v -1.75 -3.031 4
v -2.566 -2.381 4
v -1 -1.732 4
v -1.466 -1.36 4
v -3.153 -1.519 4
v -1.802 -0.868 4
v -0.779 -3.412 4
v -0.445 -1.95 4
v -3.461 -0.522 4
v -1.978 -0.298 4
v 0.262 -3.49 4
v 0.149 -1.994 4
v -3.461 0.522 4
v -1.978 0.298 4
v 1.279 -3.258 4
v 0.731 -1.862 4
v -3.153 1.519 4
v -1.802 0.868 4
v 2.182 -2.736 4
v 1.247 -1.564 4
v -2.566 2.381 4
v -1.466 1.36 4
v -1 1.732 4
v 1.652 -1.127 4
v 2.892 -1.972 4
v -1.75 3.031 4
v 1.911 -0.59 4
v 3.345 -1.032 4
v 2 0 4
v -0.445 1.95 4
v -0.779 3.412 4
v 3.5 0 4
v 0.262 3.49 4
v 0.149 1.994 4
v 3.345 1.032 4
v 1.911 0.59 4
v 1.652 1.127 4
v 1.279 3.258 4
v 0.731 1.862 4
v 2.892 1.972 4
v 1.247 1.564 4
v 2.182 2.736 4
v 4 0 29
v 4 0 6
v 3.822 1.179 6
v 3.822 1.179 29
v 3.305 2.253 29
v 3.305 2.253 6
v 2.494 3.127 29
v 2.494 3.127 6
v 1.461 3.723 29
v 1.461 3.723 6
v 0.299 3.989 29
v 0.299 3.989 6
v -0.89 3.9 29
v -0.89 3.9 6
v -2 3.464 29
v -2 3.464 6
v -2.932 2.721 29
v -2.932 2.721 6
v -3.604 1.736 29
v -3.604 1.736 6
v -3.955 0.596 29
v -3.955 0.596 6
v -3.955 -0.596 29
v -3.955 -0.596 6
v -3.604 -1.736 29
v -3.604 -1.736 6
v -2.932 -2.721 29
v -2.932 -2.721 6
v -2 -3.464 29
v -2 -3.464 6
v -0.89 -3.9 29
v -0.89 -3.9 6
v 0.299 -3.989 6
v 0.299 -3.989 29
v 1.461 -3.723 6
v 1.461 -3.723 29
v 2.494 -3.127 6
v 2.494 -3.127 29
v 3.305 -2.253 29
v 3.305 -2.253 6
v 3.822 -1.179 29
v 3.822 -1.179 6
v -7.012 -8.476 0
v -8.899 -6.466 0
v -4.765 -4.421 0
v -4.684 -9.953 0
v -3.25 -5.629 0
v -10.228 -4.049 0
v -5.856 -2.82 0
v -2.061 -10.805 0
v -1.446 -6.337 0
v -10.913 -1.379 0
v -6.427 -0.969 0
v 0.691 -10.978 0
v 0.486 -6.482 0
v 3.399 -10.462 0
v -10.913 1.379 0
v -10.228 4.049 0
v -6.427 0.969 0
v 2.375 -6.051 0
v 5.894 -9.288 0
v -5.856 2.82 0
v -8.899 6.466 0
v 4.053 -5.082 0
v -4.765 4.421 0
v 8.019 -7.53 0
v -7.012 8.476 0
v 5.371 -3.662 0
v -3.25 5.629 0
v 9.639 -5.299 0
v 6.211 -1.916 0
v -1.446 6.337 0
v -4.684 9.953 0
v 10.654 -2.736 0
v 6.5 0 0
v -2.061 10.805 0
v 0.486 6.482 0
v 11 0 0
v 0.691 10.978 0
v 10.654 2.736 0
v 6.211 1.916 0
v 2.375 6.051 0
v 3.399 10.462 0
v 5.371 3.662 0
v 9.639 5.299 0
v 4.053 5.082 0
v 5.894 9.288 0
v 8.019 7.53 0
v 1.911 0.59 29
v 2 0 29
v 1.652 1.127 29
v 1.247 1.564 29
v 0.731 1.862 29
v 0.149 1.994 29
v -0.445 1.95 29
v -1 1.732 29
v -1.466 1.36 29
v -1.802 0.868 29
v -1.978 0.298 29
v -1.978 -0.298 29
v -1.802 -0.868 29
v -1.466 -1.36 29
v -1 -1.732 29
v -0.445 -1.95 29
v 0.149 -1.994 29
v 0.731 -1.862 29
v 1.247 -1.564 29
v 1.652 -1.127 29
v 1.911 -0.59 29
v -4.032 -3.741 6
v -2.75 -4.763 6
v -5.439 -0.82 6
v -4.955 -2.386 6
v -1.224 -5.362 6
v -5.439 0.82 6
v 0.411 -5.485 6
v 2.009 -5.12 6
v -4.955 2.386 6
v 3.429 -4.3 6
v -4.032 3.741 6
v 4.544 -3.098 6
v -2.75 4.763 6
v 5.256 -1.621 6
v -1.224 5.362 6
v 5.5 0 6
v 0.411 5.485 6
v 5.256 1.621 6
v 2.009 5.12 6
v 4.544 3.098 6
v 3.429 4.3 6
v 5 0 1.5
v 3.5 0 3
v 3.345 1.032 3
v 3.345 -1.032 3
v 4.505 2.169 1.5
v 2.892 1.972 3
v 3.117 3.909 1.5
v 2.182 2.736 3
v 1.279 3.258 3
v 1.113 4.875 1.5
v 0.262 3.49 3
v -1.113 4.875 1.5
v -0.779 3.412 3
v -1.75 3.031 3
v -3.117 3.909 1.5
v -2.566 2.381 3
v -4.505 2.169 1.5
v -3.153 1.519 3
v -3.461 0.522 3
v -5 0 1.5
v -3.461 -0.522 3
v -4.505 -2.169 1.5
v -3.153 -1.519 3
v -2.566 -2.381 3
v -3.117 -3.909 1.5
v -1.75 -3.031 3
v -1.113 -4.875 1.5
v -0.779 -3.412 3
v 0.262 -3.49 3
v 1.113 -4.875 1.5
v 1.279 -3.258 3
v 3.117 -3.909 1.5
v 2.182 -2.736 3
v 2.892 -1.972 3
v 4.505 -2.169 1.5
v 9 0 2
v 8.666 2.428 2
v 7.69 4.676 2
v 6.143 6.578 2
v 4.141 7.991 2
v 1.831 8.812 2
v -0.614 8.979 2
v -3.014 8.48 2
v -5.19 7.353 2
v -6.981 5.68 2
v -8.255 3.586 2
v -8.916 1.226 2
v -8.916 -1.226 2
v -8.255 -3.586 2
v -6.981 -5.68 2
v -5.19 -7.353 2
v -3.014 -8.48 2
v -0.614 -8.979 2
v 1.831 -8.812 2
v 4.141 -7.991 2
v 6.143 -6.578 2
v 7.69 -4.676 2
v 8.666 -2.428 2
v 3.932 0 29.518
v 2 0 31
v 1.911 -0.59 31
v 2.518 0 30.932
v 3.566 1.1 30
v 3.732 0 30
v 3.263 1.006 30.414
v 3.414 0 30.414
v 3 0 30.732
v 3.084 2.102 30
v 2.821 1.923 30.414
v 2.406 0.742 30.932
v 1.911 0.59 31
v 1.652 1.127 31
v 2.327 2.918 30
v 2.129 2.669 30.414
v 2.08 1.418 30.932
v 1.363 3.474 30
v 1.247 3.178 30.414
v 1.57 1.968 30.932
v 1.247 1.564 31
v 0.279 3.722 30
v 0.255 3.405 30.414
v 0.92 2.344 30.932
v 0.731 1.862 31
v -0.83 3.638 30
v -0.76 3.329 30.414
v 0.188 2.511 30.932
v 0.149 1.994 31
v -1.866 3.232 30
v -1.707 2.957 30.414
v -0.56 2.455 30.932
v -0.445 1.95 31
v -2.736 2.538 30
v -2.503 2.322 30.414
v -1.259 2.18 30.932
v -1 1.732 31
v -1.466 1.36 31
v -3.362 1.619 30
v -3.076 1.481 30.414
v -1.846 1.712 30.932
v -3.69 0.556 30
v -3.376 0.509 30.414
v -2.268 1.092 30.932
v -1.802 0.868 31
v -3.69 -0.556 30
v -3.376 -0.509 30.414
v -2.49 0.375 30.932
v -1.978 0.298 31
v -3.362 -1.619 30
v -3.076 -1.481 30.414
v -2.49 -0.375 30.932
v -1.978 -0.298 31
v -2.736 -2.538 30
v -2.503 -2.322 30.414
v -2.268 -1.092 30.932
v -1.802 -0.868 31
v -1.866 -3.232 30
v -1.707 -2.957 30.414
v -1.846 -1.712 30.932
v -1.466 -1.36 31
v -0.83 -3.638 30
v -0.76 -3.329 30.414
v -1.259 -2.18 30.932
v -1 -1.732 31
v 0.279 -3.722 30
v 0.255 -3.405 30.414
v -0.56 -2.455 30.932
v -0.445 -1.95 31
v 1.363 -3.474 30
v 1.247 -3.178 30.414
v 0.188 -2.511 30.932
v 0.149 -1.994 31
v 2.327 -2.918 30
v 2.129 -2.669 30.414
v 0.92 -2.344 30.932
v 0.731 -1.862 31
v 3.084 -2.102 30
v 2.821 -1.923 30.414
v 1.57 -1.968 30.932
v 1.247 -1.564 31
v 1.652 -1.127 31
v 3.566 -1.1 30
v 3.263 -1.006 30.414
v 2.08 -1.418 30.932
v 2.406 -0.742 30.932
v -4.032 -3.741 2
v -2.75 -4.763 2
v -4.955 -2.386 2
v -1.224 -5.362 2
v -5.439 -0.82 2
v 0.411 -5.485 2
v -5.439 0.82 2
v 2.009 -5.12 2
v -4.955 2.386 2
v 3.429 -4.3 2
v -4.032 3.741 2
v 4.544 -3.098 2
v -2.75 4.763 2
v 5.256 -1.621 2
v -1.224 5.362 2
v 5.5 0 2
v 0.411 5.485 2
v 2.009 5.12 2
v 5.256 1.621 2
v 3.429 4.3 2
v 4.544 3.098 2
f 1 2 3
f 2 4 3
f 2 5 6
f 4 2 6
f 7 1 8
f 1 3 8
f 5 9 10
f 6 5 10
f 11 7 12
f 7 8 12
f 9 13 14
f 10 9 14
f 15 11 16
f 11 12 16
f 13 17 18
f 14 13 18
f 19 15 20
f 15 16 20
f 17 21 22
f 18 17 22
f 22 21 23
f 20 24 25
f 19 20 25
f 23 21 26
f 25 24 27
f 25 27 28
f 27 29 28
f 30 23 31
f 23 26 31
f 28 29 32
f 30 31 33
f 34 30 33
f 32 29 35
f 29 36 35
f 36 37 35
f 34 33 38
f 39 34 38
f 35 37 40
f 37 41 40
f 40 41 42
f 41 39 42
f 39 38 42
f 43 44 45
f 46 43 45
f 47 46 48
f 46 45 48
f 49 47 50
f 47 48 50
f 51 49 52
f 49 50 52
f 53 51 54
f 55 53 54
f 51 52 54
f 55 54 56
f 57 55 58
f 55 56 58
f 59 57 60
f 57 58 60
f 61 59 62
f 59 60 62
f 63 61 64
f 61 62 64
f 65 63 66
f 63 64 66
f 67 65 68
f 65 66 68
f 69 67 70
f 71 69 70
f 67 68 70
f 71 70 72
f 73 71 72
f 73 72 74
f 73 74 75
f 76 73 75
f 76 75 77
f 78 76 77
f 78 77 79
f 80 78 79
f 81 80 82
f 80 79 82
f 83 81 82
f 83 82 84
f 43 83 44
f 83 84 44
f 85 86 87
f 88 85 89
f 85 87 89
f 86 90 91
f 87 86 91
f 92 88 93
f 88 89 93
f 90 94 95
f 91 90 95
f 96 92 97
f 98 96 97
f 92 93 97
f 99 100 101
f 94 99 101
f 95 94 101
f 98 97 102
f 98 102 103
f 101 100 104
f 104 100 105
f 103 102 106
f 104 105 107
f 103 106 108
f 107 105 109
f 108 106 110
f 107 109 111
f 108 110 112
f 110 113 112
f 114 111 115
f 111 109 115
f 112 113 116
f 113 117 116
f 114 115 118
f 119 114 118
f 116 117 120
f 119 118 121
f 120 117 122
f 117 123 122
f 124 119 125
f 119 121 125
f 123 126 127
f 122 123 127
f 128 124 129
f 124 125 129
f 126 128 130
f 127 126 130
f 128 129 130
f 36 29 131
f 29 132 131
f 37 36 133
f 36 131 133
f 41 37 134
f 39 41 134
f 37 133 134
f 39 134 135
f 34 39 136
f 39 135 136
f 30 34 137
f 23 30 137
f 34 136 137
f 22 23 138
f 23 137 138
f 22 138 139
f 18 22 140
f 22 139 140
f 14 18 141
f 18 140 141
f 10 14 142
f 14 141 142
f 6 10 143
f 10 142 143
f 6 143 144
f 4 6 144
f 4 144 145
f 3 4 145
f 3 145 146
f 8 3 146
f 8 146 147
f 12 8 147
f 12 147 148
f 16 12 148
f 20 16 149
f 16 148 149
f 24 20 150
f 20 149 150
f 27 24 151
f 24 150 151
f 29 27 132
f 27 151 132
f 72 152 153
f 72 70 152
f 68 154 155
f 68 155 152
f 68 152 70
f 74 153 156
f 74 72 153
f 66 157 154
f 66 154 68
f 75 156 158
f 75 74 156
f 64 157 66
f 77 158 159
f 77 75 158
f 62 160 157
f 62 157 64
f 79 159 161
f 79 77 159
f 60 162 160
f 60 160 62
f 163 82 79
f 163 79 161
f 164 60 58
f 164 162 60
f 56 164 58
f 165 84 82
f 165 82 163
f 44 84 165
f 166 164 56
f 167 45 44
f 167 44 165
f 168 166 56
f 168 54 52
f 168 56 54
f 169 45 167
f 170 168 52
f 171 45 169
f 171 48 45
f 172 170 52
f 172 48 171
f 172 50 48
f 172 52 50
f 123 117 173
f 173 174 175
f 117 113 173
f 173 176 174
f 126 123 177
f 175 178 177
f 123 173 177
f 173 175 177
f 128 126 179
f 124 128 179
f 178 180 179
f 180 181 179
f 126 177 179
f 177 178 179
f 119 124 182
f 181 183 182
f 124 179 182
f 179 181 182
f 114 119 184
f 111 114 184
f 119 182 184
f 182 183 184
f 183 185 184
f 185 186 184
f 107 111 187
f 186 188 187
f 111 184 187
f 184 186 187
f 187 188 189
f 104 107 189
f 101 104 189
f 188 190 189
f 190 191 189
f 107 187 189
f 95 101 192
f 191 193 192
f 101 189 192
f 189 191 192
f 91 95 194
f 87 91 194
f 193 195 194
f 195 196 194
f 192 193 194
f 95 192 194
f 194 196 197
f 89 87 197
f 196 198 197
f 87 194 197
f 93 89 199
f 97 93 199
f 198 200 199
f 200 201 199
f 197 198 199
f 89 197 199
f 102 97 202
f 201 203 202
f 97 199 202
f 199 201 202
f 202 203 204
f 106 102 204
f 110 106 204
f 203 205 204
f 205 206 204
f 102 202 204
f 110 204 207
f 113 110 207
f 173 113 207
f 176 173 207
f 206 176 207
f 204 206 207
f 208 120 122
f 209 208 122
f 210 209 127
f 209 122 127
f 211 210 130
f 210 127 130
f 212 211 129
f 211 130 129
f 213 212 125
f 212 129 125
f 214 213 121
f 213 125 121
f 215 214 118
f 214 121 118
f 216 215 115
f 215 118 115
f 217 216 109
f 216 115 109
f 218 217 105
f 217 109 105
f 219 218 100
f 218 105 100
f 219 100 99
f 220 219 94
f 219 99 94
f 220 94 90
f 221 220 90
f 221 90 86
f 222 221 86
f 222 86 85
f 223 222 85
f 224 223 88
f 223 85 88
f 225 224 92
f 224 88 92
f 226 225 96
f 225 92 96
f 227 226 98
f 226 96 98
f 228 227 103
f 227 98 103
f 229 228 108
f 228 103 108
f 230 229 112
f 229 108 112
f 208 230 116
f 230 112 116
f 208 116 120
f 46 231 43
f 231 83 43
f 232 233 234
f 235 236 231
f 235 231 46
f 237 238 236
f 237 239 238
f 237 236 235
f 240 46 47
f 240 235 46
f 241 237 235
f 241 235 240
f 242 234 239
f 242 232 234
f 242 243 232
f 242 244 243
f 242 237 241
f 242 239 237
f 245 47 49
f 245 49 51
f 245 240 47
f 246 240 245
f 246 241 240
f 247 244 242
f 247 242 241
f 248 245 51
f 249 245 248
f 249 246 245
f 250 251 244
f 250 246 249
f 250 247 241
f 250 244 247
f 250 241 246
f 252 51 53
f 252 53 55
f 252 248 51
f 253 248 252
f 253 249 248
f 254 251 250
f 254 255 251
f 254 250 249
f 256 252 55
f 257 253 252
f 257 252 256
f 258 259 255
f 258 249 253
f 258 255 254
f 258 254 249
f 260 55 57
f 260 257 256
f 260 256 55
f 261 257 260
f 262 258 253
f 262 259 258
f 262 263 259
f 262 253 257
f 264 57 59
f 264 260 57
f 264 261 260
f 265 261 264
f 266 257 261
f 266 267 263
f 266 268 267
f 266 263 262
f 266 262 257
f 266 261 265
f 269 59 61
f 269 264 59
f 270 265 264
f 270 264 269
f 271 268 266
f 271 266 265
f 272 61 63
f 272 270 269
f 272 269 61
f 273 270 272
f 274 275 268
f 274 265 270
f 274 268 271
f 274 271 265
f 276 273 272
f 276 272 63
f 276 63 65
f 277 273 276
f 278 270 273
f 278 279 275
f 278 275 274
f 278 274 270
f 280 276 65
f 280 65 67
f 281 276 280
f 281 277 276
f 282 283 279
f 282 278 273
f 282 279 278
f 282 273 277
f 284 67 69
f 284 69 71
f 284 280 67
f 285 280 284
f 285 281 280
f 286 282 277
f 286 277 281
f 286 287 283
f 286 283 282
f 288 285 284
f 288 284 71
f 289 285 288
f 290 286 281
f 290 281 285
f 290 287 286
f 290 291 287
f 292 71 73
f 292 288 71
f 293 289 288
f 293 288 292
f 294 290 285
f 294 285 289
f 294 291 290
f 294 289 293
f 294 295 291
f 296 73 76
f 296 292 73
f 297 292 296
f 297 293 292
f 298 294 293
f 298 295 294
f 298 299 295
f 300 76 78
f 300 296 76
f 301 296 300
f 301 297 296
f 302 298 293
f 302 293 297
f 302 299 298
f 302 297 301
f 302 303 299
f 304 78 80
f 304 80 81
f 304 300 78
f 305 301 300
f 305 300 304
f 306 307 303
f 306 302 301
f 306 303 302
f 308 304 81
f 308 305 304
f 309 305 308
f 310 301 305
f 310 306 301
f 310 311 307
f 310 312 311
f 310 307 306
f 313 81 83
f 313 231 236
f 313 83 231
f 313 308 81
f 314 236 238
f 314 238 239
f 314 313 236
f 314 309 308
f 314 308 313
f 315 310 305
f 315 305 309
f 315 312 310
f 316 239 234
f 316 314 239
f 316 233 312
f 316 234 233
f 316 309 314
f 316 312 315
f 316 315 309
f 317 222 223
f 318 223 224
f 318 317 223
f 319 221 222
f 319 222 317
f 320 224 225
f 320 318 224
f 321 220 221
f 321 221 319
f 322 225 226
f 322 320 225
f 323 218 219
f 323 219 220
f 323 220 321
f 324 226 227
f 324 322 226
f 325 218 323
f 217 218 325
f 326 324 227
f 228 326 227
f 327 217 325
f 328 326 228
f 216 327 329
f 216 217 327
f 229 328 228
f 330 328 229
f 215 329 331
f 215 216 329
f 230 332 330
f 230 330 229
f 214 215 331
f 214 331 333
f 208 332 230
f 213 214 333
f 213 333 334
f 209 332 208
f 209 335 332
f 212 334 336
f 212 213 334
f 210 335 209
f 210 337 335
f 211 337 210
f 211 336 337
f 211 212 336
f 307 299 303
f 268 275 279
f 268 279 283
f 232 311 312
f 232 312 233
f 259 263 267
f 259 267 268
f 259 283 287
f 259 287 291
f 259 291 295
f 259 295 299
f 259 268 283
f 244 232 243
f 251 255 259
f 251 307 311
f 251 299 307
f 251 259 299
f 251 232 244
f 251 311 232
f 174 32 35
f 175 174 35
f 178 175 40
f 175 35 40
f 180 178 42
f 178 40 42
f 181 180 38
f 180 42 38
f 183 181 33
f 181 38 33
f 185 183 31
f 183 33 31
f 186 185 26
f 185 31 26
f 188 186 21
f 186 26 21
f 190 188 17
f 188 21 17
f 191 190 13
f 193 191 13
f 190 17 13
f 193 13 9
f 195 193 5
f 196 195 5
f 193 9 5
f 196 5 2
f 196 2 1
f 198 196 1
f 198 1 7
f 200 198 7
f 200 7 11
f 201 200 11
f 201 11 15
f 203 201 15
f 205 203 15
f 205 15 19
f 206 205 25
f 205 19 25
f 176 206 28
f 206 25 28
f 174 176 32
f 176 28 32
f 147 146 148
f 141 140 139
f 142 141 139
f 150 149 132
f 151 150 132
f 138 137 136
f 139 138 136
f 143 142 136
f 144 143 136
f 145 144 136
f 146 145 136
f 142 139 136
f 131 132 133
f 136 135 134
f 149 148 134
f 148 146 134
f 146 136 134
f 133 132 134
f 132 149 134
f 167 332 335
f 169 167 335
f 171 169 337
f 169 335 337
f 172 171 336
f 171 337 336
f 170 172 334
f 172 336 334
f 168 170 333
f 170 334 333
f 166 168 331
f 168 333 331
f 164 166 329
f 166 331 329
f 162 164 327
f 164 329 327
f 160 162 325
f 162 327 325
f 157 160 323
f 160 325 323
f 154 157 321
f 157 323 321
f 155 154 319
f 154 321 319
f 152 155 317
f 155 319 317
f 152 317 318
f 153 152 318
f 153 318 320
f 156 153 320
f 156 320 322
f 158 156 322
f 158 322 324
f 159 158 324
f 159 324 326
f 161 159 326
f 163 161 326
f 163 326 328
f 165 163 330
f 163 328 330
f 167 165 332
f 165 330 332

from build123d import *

# Parameters (mm, degrees)
F0_R     = 11
F1_DEPTH = 2
F2_R     = 5.5
F3_DEPTH = 4
F4_R     = 4
F5_DEPTH = 25
F6_R     = 2
F7_SIZE  = 1.99999
F8_T     = 2
F9_SIZE  = 3


# Not quite as in the source:
# - a fillet or chamfer is up to 0.001 mm smaller than in the source, because OpenCascade refuses the exact size
# - a shell that OpenCascade refuses in one call is made with other operations: the cavity is built on its own and cut out


with BuildPart() as f1:
    # F0 (on Top) → F1 (new body)
    with BuildSketch(Plane.XY):
        Circle(F0_R)
    extrude(amount=F1_DEPTH)

    # F2 (on face) → F3 (join)
    with BuildSketch(Plane.XY.offset(2)):
        Circle(F2_R)
    extrude(amount=F3_DEPTH)

    # F4 (on face) → F5 (join)
    with BuildSketch(Plane.XY.offset(6)):
        Circle(F4_R)
    extrude(amount=F5_DEPTH)

    # F6
    f6_edges = [f1.edges().sort_by_distance(p)[0] for p in [
        (-4, 0, 31),
    ]]
    fillet(f6_edges, radius=F6_R)

    # F7 (size 2 in the source; OpenCascade refuses exactly that, so slightly less here)
    f7_edges = [f1.edges().sort_by_distance(p)[0] for p in [
        (-11, 0, 2),
    ]]
    chamfer(f7_edges, length=F7_SIZE)

    # F8: shell of thickness 2, made by hand


with BuildPart() as f8_core1:
    # F8_t2: copy of F1
    add(f1.part)

    # the walls: a layer under each face that stays
    f8_faces = [f8_core1.faces().sort_by_distance(p)[0] for p in [
        (-6.0000066667, -6.0000066667, 2),
        (-10.000005, 0, 1.000005),
        (-5.5, 0, 4),
        (-11, 0, 5e-06),
        (-3.6666666667, -3.6666666667, 6),
        (-4, 0, 17.5),
        (0, 0, 31),
    ]]
    thicken(f8_faces, amount=-F8_T, mode=Mode.SUBTRACT)

    # F8_s3 → F8_t4 (revolve, cut)
    with BuildSketch(Plane.XZ):
        Polygon((5.52, 2.02), (5.5, 0), (3.5, 0), (3.5, 2), align=None)
    revolve(axis=Axis((0, 0, 2), (0, 0, 1)), mode=Mode.SUBTRACT)

    # F8_s5 → F8_t6 (revolve, cut)
    with BuildSketch(Plane.XZ):
        Polygon((4.02, 6.02), (4, 4), (2, 4), (2, 6), align=None)
    revolve(axis=Axis((0, 0, 6), (0, 0, 1)), mode=Mode.SUBTRACT)


with BuildPart() as f1_1:
    add(f1.part)

    # what is left inside the walls is the cavity
    f8_cavity = [f8_core1.part.solids().sort_by_distance(p)[0] for p in [
        (-1.98, 0, 12.333333),
    ]]
    add(f8_cavity, mode=Mode.SUBTRACT)

    # F9
    f9_edges = [f1_1.edges().sort_by_distance(p)[0] for p in [
        (-3.5, 0, 0),
    ]]
    chamfer(f9_edges, length=F9_SIZE)


solid = f1_1.part
